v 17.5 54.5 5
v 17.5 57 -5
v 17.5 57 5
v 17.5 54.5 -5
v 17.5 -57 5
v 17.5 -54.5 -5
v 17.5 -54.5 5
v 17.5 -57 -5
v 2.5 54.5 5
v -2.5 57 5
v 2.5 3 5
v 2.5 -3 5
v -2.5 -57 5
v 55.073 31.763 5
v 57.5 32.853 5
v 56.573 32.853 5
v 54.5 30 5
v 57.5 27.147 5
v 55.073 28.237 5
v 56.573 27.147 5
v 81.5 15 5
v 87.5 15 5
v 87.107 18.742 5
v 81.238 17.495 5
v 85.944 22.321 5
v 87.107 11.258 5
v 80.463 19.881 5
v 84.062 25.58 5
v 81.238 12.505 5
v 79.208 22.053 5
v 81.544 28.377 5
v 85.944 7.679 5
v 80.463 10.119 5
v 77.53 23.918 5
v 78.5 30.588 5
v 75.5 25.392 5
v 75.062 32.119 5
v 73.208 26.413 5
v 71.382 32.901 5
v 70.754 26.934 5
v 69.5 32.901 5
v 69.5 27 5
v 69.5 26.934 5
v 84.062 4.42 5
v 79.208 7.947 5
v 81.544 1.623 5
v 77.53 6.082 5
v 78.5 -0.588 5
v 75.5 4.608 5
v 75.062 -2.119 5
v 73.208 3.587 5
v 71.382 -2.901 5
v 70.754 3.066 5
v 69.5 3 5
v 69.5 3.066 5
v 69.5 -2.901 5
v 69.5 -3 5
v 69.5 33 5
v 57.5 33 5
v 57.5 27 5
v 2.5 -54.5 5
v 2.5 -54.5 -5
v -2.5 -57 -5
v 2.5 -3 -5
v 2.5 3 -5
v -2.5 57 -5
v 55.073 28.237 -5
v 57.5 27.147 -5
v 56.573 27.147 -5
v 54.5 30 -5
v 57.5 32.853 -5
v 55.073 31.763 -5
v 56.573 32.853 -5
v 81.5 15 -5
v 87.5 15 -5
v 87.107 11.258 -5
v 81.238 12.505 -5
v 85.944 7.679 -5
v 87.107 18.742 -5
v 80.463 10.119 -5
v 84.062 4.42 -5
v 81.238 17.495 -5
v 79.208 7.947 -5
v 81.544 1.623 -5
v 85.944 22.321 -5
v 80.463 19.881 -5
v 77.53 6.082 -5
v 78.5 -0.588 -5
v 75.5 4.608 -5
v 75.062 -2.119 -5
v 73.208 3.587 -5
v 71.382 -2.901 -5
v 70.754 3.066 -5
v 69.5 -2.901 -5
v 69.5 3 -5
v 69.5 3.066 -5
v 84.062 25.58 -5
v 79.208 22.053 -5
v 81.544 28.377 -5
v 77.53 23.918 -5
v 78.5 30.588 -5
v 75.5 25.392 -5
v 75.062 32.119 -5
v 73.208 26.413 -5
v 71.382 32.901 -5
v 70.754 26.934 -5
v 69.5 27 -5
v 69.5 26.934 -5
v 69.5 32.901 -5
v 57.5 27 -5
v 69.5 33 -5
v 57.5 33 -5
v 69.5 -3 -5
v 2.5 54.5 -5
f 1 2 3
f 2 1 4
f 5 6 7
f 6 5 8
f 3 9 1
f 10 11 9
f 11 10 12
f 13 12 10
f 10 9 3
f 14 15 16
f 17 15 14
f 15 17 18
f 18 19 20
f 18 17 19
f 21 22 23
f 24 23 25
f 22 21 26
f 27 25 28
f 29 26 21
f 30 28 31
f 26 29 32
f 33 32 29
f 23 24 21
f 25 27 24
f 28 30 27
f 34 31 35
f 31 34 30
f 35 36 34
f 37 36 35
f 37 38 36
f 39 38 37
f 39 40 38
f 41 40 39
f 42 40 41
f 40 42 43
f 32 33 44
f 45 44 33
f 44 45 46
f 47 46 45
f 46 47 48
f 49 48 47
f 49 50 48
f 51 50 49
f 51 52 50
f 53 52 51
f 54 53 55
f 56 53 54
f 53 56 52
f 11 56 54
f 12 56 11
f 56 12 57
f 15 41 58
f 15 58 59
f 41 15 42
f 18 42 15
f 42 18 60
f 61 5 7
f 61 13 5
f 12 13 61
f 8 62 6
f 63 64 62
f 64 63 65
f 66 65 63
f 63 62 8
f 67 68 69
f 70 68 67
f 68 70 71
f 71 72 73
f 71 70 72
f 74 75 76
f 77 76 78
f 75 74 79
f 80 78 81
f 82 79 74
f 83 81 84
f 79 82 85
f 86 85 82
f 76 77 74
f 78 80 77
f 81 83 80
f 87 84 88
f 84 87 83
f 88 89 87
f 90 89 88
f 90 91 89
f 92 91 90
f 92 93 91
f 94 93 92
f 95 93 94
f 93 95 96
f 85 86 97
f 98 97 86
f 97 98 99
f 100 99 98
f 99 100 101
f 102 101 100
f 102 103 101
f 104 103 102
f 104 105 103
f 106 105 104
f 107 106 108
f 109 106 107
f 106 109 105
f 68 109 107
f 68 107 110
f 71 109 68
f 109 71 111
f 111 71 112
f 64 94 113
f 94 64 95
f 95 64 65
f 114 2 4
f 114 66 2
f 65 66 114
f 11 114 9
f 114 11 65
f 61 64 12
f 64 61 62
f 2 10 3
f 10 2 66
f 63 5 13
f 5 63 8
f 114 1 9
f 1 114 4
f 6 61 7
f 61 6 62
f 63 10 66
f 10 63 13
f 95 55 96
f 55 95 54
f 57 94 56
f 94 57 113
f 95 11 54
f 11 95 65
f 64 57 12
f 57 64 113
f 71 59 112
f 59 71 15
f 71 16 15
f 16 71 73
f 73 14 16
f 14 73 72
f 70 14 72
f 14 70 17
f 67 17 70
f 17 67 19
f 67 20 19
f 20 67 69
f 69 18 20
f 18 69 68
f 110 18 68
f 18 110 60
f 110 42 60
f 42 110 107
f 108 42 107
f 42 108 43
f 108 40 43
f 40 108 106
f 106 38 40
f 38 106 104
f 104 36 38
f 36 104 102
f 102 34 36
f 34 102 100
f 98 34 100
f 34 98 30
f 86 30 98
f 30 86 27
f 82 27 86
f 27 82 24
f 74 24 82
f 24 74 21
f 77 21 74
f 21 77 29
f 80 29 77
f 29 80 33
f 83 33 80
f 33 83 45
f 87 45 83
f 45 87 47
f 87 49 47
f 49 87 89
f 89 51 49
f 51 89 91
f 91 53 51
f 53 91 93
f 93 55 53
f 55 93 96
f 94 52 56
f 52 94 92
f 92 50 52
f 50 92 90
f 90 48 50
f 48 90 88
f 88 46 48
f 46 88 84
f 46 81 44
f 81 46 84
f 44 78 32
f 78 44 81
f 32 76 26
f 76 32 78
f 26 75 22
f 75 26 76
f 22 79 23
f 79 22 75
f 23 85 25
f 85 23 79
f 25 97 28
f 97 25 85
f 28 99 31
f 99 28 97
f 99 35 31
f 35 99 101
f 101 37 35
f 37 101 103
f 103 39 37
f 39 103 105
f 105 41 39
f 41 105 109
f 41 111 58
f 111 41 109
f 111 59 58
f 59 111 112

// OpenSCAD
//TopBar
latchWidth=5;
latchLength=114;
latchHeight=10;

//MiddleHook
hookLength=67;
hookWidth=6;

//Hoop
openingMul=3;

//Tabs
tabsLength=15;
tabsThickness=5;

opening=hookWidth*openingMul;
hookHeight=latchHeight;

union(){
    cube([latchWidth,latchLength,latchHeight],center=true);
    translate([latchWidth+((tabsLength-latchWidth)/2),0,0]){
    difference(){
        cube([tabsLength,latchLength,latchHeight],center=true);
        cube([tabsLength,latchLength-tabsThickness,latchHeight],center=true);
    }}
    translate([(hookLength/2)+(latchWidth/2),0,0]){
        cube([hookLength,hookWidth,hookHeight],center=true);
    }
}
translate([(hookLength+(latchWidth/2)),hookWidth*(openingMul-1)+(hookWidth/2),-(hookHeight/2)]){
    linear_extrude(height=latchHeight){
    union(){
    difference(){
        circle(opening);
        translate([-(opening/2),0,0]){
        square([opening,opening*2],center=true);}
        circle(opening-hookWidth);
    }
    translate([-(hookWidth),hookWidth*(openingMul-1)+(hookWidth/2)]){
        union(){
    square([hookWidth*2,hookWidth],center=true);
            translate([-(hookWidth),0,0]){ 
            circle(hookWidth/2);
            } }
    }
 }}
}
